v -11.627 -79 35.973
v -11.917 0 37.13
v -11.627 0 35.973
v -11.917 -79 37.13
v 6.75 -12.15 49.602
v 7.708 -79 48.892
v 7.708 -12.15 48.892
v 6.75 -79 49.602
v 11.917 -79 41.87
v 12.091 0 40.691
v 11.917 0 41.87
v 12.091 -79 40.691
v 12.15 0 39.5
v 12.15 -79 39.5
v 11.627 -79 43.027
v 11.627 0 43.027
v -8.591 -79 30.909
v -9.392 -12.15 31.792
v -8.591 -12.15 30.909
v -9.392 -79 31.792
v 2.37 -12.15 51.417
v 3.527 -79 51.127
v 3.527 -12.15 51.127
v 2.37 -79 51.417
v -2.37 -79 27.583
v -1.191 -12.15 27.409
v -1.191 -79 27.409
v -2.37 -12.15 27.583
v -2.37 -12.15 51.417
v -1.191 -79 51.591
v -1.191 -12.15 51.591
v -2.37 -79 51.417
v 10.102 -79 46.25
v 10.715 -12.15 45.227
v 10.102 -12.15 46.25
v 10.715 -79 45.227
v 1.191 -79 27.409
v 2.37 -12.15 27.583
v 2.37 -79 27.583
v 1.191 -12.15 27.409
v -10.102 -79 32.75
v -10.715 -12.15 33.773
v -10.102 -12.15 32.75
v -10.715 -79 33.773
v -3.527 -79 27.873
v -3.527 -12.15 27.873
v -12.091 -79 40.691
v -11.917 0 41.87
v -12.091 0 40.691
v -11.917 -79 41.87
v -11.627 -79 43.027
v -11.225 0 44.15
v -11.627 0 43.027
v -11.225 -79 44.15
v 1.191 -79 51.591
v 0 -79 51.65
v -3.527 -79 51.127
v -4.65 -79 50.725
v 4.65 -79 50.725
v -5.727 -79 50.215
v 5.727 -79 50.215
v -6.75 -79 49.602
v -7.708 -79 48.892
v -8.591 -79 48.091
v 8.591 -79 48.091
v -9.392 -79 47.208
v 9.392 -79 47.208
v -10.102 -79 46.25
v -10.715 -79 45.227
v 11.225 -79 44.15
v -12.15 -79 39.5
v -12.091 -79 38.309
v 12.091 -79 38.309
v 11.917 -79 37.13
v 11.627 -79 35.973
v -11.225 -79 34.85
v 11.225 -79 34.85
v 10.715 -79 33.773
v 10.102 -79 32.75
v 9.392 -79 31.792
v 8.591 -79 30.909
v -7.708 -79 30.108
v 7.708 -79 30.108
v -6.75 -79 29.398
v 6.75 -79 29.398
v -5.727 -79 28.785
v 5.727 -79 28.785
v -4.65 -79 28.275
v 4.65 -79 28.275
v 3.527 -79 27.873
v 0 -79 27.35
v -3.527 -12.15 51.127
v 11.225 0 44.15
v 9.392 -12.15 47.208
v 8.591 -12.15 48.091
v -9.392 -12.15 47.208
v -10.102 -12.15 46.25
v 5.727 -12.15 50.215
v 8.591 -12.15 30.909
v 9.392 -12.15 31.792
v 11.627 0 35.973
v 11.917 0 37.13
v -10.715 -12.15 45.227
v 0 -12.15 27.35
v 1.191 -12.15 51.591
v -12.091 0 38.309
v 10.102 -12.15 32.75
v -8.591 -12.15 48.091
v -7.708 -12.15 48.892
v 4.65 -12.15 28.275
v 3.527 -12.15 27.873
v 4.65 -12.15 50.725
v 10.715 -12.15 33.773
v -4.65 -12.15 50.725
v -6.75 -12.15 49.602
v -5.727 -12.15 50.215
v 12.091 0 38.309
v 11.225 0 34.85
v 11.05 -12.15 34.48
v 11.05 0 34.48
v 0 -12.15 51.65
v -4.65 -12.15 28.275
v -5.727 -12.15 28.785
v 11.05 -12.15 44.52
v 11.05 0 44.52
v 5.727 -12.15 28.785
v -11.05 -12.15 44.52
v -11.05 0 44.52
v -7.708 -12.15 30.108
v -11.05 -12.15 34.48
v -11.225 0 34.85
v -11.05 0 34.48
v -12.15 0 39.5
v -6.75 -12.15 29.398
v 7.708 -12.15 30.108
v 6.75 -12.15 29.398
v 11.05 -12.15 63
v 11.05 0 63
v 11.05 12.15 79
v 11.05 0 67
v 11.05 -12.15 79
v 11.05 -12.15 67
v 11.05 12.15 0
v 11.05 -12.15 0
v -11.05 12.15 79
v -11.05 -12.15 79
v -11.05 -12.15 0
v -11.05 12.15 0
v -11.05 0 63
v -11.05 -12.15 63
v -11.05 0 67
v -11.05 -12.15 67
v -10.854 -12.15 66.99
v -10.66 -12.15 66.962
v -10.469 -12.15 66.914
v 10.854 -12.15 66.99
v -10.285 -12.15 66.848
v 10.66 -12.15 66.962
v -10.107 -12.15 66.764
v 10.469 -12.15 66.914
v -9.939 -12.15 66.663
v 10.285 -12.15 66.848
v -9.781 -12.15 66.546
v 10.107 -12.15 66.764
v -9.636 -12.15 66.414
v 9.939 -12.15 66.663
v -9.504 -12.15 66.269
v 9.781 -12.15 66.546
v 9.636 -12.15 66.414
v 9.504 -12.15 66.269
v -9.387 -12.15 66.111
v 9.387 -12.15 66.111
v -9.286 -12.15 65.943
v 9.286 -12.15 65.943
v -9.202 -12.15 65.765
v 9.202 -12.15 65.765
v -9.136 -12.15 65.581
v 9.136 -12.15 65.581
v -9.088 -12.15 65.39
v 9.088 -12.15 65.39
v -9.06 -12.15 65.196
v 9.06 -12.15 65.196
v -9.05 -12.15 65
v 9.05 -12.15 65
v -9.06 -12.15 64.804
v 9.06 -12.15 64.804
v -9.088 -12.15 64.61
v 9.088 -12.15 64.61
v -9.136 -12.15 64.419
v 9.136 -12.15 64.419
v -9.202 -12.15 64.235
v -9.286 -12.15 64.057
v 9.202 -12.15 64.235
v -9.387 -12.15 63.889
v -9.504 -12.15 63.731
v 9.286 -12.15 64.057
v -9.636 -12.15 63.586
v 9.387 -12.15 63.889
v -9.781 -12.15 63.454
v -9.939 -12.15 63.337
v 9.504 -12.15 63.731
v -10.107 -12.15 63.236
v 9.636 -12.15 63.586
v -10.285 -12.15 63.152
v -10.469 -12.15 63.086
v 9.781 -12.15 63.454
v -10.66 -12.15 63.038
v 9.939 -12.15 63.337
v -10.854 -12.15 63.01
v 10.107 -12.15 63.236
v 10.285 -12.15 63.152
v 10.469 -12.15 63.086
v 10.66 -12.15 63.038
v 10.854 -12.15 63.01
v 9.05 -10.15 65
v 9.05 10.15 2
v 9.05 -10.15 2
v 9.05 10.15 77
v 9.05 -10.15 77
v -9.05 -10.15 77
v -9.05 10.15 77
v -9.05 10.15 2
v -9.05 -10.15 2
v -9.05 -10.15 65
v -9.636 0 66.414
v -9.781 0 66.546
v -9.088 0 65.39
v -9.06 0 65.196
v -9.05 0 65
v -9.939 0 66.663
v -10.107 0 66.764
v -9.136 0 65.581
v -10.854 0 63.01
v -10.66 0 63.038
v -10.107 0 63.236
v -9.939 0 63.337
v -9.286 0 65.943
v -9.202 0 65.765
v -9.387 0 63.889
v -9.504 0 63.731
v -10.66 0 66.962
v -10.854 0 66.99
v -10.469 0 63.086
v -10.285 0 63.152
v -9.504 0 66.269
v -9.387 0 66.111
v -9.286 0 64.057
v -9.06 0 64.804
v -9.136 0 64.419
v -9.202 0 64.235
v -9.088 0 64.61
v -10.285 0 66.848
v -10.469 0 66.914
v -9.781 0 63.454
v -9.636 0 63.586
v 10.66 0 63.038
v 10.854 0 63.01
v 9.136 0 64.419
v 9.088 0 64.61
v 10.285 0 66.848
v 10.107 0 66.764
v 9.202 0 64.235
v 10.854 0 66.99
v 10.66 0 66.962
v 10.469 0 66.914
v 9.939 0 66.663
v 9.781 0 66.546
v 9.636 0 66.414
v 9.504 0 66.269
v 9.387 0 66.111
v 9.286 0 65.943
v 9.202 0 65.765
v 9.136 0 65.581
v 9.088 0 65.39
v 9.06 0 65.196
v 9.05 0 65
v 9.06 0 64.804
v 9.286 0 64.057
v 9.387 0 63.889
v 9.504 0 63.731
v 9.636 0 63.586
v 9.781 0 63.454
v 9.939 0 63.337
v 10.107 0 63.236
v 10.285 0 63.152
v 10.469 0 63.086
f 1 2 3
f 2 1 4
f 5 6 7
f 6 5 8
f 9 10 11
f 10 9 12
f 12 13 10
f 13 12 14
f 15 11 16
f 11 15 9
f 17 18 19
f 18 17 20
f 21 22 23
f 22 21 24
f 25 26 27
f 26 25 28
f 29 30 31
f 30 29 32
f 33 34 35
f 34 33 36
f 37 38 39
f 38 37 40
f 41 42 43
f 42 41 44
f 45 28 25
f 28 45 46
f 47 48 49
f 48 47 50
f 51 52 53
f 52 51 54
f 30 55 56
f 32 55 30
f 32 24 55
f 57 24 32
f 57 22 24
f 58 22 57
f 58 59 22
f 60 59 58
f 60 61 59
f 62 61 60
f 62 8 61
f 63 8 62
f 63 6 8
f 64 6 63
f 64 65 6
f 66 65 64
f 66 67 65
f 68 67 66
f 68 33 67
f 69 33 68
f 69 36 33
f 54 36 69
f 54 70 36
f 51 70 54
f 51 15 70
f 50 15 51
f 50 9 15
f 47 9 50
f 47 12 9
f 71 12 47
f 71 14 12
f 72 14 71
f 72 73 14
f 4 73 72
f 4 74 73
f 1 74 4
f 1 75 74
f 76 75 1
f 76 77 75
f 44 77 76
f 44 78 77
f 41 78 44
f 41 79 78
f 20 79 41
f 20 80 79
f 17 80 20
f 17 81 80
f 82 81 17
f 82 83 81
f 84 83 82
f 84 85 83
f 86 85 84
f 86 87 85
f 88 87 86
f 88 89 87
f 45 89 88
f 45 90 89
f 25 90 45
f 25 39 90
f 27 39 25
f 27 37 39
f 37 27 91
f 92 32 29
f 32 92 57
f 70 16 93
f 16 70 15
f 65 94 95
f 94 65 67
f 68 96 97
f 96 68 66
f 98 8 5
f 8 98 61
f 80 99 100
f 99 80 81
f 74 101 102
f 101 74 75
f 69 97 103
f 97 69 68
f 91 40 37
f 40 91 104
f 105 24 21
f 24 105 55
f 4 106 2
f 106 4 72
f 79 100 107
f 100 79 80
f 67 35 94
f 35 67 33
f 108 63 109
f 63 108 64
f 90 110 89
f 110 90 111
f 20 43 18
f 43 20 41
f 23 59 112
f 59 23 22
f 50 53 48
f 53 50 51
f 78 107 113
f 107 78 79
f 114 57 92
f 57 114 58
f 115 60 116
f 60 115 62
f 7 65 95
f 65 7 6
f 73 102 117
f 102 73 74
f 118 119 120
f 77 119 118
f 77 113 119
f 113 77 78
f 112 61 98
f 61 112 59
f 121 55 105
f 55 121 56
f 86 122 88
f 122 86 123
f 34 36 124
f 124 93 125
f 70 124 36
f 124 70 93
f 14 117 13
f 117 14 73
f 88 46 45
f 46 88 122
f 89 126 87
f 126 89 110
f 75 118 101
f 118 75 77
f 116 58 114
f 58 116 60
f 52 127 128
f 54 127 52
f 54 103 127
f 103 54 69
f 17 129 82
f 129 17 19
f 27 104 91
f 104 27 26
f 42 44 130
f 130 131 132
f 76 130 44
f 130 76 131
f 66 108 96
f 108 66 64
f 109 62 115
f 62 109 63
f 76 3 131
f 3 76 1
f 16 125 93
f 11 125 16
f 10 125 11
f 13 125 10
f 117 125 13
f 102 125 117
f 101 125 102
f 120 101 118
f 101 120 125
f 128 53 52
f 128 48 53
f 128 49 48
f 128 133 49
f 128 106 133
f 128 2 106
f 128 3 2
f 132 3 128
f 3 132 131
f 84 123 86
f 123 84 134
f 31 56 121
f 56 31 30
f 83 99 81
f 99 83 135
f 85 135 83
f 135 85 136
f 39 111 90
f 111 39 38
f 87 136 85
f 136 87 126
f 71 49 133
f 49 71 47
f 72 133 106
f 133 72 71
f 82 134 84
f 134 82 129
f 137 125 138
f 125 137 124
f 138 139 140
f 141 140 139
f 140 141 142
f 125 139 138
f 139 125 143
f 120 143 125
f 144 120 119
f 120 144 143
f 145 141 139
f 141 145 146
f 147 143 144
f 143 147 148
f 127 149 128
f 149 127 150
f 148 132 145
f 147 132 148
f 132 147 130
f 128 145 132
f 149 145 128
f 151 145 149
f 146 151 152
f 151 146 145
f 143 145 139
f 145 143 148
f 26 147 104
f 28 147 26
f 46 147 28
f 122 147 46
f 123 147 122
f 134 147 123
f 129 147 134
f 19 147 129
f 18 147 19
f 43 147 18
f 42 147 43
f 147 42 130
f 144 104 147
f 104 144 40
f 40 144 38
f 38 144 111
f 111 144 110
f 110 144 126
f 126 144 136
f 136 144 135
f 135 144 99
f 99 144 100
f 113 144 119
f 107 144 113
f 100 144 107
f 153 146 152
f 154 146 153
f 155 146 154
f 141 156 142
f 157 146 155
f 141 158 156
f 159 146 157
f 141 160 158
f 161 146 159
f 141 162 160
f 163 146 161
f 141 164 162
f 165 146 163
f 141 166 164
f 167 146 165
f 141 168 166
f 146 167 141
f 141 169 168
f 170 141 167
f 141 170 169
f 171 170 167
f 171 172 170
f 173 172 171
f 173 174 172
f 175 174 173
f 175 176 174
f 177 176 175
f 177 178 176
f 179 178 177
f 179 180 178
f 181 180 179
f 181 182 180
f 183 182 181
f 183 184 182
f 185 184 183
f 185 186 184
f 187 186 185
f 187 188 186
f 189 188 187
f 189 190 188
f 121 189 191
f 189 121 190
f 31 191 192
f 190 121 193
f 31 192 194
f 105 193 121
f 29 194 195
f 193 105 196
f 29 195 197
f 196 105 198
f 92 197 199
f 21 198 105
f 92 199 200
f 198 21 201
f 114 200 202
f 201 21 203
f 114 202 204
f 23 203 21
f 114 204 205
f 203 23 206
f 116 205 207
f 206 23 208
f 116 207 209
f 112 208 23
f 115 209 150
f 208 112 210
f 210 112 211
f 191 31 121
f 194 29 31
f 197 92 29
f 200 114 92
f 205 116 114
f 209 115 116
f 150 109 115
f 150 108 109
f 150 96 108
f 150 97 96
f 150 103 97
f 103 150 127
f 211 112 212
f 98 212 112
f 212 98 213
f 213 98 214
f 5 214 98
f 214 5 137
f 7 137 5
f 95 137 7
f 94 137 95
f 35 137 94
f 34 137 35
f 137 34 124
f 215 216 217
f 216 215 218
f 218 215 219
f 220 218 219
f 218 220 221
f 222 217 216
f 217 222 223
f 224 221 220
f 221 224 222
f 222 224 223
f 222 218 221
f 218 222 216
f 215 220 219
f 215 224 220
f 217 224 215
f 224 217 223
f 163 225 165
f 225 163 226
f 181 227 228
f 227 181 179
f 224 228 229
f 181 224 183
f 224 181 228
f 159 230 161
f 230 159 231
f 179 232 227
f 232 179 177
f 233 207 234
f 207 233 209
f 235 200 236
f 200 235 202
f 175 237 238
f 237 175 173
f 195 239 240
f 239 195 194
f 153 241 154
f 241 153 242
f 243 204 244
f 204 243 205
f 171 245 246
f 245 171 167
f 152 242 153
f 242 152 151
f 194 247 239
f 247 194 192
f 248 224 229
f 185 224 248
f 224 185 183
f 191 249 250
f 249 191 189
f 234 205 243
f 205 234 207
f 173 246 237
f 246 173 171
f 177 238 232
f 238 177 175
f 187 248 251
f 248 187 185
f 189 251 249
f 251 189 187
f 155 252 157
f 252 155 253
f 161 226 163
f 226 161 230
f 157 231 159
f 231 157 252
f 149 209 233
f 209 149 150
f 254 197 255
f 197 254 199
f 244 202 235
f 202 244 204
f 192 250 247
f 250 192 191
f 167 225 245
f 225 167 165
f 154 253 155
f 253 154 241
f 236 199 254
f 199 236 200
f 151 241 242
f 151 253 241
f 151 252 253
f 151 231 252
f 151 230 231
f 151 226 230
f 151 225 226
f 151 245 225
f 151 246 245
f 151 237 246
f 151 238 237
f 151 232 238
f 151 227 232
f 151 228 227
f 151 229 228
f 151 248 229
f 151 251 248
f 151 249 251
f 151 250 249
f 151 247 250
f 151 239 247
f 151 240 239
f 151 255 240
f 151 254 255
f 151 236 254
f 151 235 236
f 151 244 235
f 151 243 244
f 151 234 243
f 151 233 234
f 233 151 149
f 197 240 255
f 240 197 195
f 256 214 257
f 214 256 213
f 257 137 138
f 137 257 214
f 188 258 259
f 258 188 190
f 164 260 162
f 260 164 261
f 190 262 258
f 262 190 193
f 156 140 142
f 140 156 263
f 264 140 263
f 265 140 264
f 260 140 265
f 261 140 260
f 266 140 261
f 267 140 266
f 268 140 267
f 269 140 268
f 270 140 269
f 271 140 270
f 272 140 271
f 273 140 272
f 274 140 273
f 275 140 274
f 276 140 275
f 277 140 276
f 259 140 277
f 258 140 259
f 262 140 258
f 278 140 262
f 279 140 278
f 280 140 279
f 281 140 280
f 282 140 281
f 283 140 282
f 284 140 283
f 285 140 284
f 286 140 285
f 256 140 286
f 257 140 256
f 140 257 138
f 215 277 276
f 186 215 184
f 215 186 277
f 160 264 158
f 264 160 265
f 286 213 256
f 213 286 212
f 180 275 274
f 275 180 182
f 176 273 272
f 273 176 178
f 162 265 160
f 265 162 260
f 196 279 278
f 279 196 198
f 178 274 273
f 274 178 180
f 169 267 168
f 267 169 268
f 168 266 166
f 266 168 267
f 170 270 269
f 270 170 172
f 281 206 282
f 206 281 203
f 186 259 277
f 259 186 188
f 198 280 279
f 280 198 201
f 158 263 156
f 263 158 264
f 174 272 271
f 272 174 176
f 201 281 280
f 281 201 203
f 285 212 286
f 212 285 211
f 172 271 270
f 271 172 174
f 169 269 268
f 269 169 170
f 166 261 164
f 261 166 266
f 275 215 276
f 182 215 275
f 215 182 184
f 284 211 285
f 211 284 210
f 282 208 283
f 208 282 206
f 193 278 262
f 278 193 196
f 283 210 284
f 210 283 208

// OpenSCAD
module u_shaped_bracket() {
    difference() {
        // Main U-shaped body
        union() {
            // Outer rounded back
            translate([0, 0, 39.5])
                rotate([90, 0, 0])
                cylinder(h=79, r=12.15, $fn=64);
            
            // Side walls
            translate([-11.05, -12.15, 0])
                cube([22.1, 24.3, 79]);
        }
        
        // Internal channel
        translate([-9.05, -10.15, 2])
            cube([18.1, 20.3, 75]);
        
        // Cylindrical through-holes
        translate([-11.05, 0, 65])
            rotate([90, 0, 0])
            cylinder(h=24.3, r=2, $fn=64);
        translate([11.05, 0, 65])
            rotate([90, 0, 0])
            cylinder(h=24.3, r=2, $fn=64);
    }
    
    // End tabs/lips
    translate([-11.05, -12.15, 0])
        cube([22.1, 2, 2]);
    translate([-11.05, 10.15, 0])
        cube([22.1, 2, 2]);
}

u_shaped_bracket();
